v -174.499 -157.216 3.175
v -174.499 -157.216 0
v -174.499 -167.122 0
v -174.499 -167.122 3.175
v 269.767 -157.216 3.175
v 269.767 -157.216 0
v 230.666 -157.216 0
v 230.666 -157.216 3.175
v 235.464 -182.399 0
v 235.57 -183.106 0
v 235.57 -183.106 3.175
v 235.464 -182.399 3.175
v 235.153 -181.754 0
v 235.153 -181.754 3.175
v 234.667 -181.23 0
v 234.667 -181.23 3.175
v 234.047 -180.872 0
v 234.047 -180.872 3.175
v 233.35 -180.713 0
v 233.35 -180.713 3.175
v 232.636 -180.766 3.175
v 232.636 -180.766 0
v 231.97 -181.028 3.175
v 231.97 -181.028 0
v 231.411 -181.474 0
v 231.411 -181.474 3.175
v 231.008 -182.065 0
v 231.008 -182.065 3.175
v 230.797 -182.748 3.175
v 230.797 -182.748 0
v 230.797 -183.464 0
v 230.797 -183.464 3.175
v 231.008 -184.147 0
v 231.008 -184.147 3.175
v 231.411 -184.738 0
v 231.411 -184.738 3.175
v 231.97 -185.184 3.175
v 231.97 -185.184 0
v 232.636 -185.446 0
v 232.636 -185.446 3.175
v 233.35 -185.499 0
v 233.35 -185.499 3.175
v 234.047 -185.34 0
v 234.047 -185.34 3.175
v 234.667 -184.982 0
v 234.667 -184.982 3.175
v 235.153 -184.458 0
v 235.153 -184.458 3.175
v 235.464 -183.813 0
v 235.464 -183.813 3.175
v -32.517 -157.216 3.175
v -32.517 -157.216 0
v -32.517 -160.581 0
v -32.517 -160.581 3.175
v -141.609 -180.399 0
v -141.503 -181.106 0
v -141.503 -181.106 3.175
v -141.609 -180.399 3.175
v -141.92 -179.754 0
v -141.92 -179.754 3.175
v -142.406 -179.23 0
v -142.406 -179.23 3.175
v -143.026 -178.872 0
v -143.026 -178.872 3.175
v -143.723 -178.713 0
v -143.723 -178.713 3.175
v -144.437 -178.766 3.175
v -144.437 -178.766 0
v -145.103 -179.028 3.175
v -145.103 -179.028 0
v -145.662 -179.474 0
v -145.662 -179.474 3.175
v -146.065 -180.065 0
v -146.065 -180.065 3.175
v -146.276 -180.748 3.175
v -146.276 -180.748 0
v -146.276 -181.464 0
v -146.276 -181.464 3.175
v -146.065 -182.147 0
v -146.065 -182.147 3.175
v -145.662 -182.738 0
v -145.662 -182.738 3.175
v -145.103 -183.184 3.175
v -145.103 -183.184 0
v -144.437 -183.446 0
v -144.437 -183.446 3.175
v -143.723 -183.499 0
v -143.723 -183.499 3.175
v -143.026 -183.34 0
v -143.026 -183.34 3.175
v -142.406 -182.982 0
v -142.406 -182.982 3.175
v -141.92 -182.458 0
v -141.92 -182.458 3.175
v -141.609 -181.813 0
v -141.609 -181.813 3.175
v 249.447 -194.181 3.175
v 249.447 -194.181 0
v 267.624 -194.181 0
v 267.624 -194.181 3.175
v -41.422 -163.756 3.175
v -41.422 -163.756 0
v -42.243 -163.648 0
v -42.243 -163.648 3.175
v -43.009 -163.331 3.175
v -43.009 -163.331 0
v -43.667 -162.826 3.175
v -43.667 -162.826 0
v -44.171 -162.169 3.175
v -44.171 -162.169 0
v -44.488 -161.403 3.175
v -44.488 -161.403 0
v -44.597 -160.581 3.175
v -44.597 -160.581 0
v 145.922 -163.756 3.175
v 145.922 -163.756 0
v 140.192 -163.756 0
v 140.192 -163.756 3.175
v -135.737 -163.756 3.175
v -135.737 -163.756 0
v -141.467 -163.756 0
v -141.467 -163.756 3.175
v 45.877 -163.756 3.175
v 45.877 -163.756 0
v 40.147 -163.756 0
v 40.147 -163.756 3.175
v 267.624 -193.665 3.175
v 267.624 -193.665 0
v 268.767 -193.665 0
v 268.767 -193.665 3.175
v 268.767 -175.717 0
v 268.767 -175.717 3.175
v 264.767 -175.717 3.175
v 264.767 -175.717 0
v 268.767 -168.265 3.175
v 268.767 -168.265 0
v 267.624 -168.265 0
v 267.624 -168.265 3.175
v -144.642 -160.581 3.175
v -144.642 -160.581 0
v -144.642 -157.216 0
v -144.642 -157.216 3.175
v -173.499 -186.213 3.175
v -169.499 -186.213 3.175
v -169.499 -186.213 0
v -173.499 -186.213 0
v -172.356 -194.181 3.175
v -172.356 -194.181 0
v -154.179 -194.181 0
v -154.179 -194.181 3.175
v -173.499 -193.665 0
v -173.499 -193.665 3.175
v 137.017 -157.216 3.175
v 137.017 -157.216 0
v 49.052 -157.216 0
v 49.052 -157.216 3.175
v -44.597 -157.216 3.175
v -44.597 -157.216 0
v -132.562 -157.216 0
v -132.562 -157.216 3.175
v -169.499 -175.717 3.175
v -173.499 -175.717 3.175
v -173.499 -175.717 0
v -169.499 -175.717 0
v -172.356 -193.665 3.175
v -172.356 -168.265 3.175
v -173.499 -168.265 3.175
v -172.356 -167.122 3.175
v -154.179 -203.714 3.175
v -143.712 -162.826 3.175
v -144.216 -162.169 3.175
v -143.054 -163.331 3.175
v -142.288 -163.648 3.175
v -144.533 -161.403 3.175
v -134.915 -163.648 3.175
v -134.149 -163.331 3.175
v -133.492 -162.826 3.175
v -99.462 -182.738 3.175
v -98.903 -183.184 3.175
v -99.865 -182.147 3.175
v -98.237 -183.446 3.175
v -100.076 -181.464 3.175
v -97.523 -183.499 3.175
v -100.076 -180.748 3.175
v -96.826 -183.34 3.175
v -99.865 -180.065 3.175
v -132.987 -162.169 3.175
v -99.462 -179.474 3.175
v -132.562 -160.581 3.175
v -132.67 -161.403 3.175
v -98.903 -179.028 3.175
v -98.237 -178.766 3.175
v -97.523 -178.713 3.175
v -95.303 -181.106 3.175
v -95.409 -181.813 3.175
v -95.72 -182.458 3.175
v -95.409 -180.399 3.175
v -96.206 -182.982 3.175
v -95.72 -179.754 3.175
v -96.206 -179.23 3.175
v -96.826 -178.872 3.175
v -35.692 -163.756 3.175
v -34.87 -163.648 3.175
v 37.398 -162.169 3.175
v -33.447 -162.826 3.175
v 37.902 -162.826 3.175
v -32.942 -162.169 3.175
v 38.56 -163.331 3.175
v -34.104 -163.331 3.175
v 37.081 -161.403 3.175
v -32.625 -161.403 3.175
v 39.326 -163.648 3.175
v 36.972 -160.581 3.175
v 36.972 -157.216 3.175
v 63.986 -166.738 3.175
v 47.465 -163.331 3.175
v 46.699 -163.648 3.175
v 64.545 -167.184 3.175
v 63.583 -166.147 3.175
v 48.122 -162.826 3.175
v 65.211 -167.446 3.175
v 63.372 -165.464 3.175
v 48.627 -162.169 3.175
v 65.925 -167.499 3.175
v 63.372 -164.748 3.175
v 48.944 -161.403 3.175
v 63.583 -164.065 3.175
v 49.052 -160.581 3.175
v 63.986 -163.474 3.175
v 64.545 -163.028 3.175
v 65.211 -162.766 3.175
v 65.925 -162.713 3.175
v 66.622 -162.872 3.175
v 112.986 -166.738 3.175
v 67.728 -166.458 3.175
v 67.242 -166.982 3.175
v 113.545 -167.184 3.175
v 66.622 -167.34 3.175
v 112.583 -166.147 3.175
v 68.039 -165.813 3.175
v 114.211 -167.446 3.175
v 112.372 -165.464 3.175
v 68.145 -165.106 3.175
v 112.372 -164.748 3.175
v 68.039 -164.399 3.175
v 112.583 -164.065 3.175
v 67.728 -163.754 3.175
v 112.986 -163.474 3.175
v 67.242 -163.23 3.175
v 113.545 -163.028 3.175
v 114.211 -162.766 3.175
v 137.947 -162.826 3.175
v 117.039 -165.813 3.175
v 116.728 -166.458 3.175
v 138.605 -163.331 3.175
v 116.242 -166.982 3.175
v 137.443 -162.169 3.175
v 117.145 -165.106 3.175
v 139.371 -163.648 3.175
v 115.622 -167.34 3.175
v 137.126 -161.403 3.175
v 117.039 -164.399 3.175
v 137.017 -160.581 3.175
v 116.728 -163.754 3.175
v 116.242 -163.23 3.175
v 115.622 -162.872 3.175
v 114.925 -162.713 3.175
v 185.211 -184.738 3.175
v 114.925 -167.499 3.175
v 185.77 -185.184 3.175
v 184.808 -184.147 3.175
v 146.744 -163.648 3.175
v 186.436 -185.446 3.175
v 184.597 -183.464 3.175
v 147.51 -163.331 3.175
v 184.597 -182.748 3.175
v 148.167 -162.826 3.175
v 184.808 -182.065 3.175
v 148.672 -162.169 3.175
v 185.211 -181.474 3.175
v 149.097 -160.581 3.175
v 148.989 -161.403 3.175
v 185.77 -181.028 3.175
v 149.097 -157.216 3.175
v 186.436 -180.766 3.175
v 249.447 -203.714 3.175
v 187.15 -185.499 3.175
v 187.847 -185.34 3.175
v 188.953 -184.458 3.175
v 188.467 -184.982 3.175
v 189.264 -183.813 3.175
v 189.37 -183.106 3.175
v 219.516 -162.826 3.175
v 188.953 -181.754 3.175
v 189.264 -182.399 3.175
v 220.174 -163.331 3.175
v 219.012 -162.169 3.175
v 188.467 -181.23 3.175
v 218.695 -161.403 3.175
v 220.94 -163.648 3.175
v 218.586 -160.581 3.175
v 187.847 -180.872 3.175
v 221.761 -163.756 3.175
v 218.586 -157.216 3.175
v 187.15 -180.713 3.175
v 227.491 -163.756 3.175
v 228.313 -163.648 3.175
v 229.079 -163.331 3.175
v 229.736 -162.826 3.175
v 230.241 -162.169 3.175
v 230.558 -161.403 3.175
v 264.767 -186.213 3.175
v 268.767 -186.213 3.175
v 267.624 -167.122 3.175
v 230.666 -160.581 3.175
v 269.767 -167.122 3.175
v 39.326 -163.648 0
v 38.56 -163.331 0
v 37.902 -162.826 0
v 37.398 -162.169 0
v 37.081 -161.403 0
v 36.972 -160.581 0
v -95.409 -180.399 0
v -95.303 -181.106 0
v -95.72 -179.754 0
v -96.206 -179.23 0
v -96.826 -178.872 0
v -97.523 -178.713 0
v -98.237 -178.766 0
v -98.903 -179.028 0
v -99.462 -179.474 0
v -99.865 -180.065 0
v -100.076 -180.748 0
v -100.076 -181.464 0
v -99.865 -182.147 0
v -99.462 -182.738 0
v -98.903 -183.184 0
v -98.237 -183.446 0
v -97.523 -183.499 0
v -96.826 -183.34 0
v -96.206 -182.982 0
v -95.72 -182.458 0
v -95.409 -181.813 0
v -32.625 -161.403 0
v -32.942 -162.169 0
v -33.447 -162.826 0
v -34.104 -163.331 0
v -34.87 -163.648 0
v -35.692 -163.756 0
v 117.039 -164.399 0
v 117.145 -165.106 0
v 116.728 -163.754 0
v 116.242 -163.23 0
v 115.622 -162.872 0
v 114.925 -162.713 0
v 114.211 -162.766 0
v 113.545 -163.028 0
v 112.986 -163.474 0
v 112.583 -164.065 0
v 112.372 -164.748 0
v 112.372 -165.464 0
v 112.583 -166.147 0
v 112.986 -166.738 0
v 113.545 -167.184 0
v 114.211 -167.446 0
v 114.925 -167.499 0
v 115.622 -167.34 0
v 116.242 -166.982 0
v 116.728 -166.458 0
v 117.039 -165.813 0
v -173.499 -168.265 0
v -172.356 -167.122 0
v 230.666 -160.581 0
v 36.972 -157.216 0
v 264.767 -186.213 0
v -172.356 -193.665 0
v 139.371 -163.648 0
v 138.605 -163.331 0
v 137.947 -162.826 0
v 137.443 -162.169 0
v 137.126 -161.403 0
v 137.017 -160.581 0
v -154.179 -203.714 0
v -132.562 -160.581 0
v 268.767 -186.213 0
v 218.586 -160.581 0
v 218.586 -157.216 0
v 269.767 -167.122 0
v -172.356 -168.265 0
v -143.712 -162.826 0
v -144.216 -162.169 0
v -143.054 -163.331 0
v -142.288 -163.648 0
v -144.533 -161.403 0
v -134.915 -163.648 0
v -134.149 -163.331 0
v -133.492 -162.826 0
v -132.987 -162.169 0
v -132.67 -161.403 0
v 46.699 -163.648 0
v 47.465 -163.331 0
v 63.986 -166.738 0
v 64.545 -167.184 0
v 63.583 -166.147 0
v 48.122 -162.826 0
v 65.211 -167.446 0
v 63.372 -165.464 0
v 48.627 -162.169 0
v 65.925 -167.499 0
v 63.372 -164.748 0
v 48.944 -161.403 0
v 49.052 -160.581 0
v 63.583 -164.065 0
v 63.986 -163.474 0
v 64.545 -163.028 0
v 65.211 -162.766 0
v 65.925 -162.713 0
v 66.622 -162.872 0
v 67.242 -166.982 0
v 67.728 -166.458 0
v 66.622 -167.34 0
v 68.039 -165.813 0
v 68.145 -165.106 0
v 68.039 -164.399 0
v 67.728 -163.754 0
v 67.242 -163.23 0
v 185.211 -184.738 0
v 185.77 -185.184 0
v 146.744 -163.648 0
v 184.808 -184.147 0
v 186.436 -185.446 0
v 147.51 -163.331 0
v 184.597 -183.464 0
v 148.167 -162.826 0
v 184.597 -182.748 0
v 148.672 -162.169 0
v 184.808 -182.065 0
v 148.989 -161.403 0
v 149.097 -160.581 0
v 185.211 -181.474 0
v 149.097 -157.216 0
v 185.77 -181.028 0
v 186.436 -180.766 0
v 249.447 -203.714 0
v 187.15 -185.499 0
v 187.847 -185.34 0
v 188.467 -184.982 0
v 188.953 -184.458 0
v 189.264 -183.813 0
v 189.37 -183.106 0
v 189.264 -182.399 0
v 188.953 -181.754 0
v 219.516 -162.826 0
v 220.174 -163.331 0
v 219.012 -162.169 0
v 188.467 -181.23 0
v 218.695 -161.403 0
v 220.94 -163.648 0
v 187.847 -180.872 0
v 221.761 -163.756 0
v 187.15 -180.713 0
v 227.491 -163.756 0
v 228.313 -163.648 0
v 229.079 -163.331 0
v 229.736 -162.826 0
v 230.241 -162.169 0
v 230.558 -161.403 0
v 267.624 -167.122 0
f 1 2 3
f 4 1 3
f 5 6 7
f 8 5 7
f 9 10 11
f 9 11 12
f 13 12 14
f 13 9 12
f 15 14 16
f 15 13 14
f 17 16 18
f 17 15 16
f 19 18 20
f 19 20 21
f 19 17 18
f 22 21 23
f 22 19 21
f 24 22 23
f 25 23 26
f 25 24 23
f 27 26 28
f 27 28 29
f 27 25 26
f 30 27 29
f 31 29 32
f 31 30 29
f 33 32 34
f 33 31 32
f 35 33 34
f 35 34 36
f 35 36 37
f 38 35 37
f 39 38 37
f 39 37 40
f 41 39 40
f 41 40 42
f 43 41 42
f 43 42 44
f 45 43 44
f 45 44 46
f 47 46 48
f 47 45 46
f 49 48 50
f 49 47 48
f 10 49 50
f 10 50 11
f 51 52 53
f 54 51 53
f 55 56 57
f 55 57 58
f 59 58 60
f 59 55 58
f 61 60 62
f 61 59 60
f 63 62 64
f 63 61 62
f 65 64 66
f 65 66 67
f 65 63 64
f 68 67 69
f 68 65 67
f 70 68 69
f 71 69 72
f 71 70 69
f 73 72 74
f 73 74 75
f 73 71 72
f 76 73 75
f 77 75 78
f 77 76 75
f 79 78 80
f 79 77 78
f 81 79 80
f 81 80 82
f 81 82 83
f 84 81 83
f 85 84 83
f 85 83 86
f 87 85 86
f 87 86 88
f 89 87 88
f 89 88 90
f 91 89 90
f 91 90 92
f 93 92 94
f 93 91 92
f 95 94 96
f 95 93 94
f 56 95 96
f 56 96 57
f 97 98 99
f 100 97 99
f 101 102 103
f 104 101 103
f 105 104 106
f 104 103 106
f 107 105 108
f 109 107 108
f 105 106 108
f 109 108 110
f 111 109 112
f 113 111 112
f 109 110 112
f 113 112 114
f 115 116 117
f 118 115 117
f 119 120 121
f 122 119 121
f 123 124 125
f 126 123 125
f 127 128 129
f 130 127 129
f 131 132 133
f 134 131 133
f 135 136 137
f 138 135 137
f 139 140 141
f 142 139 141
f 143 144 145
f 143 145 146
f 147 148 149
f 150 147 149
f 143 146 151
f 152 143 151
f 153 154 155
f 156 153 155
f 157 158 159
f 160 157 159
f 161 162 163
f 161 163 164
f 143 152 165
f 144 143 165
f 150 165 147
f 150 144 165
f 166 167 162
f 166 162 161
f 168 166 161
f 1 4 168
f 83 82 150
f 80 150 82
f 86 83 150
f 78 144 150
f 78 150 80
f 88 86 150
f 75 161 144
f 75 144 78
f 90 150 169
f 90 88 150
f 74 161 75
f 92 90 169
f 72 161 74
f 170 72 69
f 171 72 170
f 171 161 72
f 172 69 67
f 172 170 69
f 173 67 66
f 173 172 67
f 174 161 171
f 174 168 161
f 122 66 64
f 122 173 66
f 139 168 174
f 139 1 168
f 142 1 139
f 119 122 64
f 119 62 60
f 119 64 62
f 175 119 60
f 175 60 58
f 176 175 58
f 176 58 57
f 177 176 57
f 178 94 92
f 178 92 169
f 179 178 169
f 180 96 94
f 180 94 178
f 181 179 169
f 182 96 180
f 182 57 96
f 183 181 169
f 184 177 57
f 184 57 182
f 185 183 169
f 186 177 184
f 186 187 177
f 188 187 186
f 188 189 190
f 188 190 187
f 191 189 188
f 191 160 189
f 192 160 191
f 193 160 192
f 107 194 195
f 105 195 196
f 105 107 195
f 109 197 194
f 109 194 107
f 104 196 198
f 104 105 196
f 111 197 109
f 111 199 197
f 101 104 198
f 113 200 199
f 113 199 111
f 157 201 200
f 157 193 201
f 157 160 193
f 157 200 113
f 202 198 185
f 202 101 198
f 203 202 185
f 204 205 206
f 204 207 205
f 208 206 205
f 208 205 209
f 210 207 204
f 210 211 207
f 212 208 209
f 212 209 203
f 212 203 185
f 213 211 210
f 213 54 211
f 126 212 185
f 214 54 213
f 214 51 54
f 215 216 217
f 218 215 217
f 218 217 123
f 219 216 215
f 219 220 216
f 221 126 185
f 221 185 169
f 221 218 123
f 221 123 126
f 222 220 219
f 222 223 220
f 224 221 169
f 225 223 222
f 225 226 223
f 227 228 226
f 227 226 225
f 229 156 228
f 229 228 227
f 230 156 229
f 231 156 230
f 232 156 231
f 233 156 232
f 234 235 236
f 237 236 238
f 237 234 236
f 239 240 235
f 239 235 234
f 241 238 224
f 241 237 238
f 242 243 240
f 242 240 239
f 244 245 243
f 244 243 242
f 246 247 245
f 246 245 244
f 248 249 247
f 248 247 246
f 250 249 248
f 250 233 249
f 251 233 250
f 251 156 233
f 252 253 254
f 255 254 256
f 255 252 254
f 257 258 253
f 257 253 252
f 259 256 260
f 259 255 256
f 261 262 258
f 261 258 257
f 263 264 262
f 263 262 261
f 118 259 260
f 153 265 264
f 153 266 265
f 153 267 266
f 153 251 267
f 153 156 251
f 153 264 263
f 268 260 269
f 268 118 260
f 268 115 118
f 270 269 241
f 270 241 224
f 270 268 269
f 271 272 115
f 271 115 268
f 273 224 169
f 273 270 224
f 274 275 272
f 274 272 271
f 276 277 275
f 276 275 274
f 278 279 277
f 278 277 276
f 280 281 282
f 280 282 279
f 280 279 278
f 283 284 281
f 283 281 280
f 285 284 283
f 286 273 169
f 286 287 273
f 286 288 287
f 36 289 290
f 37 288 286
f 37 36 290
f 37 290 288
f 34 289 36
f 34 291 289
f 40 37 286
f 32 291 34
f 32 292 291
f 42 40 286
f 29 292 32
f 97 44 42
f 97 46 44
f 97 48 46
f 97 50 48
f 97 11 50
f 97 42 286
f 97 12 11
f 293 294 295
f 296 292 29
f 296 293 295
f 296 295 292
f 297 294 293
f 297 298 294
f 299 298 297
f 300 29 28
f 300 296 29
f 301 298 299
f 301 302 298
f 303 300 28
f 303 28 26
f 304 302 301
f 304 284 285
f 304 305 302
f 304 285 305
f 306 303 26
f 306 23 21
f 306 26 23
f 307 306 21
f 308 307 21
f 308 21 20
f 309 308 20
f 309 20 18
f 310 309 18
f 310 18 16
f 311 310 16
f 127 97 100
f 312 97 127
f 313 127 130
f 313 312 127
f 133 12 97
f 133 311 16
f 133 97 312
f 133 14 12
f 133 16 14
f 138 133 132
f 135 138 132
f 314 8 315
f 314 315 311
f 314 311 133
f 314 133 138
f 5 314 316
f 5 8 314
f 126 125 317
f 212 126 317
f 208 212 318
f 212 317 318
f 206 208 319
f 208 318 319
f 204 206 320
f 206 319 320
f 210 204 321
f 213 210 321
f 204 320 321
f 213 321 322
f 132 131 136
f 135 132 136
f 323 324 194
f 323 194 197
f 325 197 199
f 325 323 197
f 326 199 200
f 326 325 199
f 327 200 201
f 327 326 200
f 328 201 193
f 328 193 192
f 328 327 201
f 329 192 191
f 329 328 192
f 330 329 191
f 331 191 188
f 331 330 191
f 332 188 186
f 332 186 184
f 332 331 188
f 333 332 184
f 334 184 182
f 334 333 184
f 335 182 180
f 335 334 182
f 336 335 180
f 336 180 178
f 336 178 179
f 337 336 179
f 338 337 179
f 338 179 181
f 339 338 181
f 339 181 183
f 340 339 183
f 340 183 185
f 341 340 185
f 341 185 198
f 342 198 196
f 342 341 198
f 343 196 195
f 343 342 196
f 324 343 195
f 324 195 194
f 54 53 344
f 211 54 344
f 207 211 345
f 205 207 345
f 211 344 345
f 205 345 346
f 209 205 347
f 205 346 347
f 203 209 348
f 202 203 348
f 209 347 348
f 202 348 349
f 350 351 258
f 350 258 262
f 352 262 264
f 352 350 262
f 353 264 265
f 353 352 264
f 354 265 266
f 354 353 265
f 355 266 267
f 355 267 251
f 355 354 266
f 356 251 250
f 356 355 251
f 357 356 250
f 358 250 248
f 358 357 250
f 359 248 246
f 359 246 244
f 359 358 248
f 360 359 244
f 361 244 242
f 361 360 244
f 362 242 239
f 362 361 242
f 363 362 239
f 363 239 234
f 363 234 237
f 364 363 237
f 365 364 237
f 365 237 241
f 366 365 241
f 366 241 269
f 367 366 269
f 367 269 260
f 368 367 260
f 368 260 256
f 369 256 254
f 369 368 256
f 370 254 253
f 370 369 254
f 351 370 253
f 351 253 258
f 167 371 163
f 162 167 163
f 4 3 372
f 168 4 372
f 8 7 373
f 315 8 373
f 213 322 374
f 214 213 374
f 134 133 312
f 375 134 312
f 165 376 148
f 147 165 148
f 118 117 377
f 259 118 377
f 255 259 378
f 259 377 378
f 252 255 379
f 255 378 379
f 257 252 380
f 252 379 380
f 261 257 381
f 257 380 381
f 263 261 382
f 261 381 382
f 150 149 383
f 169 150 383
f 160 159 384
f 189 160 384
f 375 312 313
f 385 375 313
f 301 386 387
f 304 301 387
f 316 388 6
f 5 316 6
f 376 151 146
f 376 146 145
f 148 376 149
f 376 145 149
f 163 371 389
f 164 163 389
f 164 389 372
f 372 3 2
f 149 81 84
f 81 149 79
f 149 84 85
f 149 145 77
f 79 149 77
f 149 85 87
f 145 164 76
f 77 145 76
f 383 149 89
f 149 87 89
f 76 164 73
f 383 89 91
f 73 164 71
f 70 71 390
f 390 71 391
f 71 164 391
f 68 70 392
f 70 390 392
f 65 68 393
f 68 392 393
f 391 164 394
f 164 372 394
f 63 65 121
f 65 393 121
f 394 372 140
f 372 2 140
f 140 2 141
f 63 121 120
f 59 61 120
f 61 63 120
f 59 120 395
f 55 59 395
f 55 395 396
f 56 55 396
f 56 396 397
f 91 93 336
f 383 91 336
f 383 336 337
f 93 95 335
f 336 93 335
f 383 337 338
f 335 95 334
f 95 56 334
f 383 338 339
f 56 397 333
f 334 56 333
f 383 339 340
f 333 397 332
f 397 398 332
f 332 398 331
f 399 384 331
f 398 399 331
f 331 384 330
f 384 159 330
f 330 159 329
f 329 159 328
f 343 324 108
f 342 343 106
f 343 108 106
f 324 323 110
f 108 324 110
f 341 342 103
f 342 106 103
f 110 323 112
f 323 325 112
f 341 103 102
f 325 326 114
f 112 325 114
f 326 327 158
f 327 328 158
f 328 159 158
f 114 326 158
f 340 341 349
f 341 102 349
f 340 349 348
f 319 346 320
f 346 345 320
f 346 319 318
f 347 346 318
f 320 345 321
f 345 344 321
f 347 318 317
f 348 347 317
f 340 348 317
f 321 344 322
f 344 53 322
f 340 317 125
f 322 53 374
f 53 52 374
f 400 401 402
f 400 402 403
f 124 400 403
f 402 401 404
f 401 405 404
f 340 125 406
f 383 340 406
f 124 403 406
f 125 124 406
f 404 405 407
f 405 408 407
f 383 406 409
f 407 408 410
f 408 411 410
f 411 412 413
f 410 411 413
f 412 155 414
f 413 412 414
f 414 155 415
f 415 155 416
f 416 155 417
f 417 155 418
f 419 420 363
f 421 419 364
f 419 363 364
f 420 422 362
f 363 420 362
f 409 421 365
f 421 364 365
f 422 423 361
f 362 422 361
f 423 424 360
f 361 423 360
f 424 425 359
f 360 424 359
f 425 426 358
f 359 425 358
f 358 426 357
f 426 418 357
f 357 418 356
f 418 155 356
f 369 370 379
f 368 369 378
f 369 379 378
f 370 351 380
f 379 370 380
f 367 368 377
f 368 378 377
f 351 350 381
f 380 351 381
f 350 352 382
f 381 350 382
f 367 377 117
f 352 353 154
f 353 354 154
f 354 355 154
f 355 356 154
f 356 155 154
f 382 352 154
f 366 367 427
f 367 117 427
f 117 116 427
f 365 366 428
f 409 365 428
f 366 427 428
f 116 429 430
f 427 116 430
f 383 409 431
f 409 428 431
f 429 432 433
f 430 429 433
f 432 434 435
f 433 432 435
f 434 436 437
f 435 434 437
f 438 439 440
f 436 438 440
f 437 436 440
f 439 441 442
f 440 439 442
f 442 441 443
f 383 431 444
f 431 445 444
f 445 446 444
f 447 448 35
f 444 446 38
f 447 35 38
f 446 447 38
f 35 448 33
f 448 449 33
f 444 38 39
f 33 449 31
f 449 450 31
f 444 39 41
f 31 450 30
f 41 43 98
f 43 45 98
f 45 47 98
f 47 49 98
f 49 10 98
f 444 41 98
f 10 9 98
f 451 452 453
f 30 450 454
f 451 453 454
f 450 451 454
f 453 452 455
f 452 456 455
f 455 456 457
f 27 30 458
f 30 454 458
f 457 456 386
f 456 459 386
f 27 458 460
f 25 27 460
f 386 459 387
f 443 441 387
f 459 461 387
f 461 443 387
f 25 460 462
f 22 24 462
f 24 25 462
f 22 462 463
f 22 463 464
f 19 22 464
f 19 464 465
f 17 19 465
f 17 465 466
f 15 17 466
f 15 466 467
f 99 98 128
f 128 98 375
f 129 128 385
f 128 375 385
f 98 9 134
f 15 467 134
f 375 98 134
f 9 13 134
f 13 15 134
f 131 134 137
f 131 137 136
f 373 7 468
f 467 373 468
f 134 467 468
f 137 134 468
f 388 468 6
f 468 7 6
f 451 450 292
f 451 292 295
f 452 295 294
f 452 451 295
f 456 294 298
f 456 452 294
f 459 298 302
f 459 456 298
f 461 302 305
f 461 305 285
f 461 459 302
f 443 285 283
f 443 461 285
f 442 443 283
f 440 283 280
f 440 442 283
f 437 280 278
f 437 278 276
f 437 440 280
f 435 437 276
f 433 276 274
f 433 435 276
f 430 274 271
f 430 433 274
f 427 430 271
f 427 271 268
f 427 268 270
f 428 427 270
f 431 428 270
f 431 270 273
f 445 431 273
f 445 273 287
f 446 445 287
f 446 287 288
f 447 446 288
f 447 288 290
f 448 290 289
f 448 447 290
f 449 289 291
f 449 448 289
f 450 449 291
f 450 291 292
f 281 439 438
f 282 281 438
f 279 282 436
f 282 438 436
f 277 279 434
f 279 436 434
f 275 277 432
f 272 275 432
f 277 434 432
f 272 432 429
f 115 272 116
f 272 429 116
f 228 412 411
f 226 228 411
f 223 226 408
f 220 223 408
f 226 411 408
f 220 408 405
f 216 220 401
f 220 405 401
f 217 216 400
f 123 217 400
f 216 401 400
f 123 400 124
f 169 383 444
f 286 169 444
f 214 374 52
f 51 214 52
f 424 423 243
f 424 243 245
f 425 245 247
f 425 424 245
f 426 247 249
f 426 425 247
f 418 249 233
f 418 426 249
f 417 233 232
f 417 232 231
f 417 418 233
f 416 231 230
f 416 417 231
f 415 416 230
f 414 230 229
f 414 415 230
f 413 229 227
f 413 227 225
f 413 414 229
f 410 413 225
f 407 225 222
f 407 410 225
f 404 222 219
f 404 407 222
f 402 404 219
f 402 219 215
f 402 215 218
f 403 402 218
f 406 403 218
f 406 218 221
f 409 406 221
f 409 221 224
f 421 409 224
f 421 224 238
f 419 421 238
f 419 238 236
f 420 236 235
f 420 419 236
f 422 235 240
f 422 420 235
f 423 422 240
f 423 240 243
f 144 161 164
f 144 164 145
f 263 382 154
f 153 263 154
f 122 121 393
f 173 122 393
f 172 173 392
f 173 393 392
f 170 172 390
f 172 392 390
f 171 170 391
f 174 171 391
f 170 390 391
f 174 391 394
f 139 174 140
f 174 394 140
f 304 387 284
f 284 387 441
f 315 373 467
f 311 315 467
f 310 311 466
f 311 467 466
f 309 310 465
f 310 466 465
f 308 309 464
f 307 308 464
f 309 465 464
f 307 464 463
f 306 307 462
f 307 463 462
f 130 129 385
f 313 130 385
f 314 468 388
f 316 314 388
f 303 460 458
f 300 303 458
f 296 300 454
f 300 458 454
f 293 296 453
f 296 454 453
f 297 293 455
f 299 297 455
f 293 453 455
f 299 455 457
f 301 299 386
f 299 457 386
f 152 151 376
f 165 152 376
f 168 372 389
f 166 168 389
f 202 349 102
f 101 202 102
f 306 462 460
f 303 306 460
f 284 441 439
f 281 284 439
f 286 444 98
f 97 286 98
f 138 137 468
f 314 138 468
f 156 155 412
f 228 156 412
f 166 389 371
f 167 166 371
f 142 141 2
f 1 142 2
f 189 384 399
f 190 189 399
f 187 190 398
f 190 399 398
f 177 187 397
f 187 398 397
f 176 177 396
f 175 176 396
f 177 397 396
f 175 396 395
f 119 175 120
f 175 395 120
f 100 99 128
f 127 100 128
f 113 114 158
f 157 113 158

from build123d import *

# Parameters (mm, degrees)
BOSS_EXTRUDE1_DEPTH          = 3.175
M4_CLEARANCE_HOLE1_OUTLINE_R = 2.4
M4_CLEARANCE_HOLE1_DEPTH     = 3.175
CUT_EXTRUDE1_DEPTH           = 3.175


# Read off the part's stored shape, not the designer's step: M4 Clearance Hole1
with BuildPart() as part:
    # Sketch2 → Boss-Extrude1 (new body)
    with BuildSketch(Plane.XY):
        with BuildLine():
            Line((227.491320086, -163.756000107), (221.761320086, -163.756000107))
            ThreePointArc((221.761320086, -163.756000107), (219.516256056, -162.826064137), (218.586320086, -160.581000107))
            Line((218.586320086, -160.581000107), (218.586320086, -157.216000107))
            Line((218.586320086, -157.216000107), (149.097320094, -157.216000107))
            Line((149.097320094, -157.216000107), (149.097320094, -160.581000107))
            ThreePointArc((149.097320094, -160.581000107), (148.167384125, -162.826064137), (145.922320094, -163.756000107))
            Line((145.922320094, -163.756000107), (140.192320094, -163.756000107))
            ThreePointArc((140.192320094, -163.756000107), (137.947256064, -162.826064137), (137.017320094, -160.581000107))
            Line((137.017320094, -160.581000107), (137.017320094, -157.216000107))
            Line((137.017320094, -157.216000107), (49.052320094, -157.216000107))
            Line((49.052320094, -157.216000107), (49.052320094, -160.581000107))
            ThreePointArc((49.052320094, -160.581000107), (48.122384125, -162.826064137), (45.877320094, -163.756000107))
            Line((45.877320094, -163.756000107), (40.147320094, -163.756000107))
            ThreePointArc((40.147320094, -163.756000107), (37.902256064, -162.826064137), (36.972320094, -160.581000107))
            Line((36.972320094, -160.581000107), (36.972320094, -157.216000107))
            Line((36.972320094, -157.216000107), (-32.516679898, -157.216000107))
            Line((-32.516679898, -157.216000107), (-32.516679898, -160.581000107))
            ThreePointArc((-32.516679898, -160.581000107), (-33.446615867, -162.826064137), (-35.691679898, -163.756000107))
            Line((-35.691679898, -163.756000107), (-41.421679898, -163.756000107))
            ThreePointArc((-41.421679898, -163.756000107), (-43.666743928, -162.826064137), (-44.596679898, -160.581000107))
            Line((-44.596679898, -160.581000107), (-44.596679898, -157.216000107))
            Line((-44.596679898, -157.216000107), (-132.561679898, -157.216000107))
            Line((-132.561679898, -157.216000107), (-132.561679898, -160.581000107))
            ThreePointArc((-132.561679898, -160.581000107), (-133.491615867, -162.826064137), (-135.736679898, -163.756000107))
            Line((-135.736679898, -163.756000107), (-141.466679898, -163.756000107))
            ThreePointArc((-141.466679898, -163.756000107), (-143.711743928, -162.826064137), (-144.641679898, -160.581000107))
            Line((-144.641679898, -160.581000107), (-144.641679898, -157.216000107))
            Line((-144.641679898, -157.216000107), (-174.499179878, -157.216000107))
            Line((-174.499179878, -157.216000107), (-174.499179878, -167.122000107))
            Line((-174.499179878, -167.122000107), (-172.356179878, -167.122000107))
            Line((-172.356179878, -167.122000107), (-172.356179878, -168.265000107))
            Line((-172.356179878, -168.265000107), (-173.499179878, -168.265000107))
            Line((-173.499179878, -168.265000107), (-173.499179878, -193.665000107))
            Line((-173.499179878, -193.665000107), (-172.356179878, -193.665000107))
            Line((-172.356179878, -193.665000107), (-172.356179878, -194.181000107))
            Line((-172.356179878, -194.181000107), (-154.179179878, -194.181000107))
            Line((-154.179179878, -194.181000107), (-154.179179878, -203.714000107))
            Line((-154.179179878, -203.714000107), (249.446820082, -203.714000107))
            Line((249.446820082, -203.714000107), (249.446820082, -194.181000107))
            Line((249.446820082, -194.181000107), (267.623820082, -194.181000107))
            Line((267.623820082, -194.181000107), (267.623820082, -193.665000107))
            Line((267.623820082, -193.665000107), (268.766820082, -193.665000107))
            Line((268.766820082, -193.665000107), (268.766820082, -168.265000107))
            Line((268.766820082, -168.265000107), (267.623820082, -168.265000107))
            Line((267.623820082, -168.265000107), (267.623820082, -167.122000107))
            Line((267.623820082, -167.122000107), (269.766820082, -167.122000107))
            Line((269.766820082, -167.122000107), (269.766820082, -157.216000107))
            Line((269.766820082, -157.216000107), (230.666320086, -157.216000107))
            Line((230.666320086, -157.216000107), (230.666320086, -160.581000107))
            ThreePointArc((230.666320086, -160.581000107), (229.736384117, -162.826064137), (227.491320086, -163.756000107))
        make_face()
    extrude(amount=BOSS_EXTRUDE1_DEPTH)

    # M4 Clearance Hole1 outline → M4 Clearance Hole1 (cut)
    with BuildSketch(Plane.XY):
        with Locations((233.170320102, -183.106000107)):
            Circle(M4_CLEARANCE_HOLE1_OUTLINE_R)
        with Locations((186.970320102, -183.106000107)):
            Circle(M4_CLEARANCE_HOLE1_OUTLINE_R)
        with Locations((114.745320102, -165.106000107)):
            Circle(M4_CLEARANCE_HOLE1_OUTLINE_R)
        with Locations((65.745320102, -165.106000107)):
            Circle(M4_CLEARANCE_HOLE1_OUTLINE_R)
        with Locations((-97.702679898, -181.106000107)):
            Circle(M4_CLEARANCE_HOLE1_OUTLINE_R)
        with Locations((-143.902679898, -181.106000107)):
            Circle(M4_CLEARANCE_HOLE1_OUTLINE_R)
    extrude(amount=M4_CLEARANCE_HOLE1_DEPTH, mode=Mode.SUBTRACT)

    # Sketch5 → Cut-Extrude1 (cut)
    with BuildSketch(Plane.XY.offset(3.175)):
        Polygon((264.766820082, -175.717058259), (268.766820082, -175.717058259), (268.766820082, -176.460000107), (266.515167585, -176.460000107), (264.766820082, -176.928468408), align=None)
        with BuildLine():
            Line((271.531820082, -185.652747691), (271.531820082, -186.212941955))
            Line((271.531820082, -186.212941955), (268.766820082, -186.212941955))
            Line((268.766820082, -186.212941955), (268.766820082, -185.470000107))
            Line((268.766820082, -185.470000107), (266.515167585, -185.470000107))
            Line((266.515167585, -185.470000107), (264.766820082, -185.001531806))
            Line((264.766820082, -185.001531806), (264.766820082, -176.928468408))
            Line((264.766820082, -176.928468408), (266.515167585, -176.460000107))
            Line((266.515167585, -176.460000107), (268.766820082, -176.460000107))
            Line((268.766820082, -176.460000107), (268.766820082, -175.717058259))
            Line((268.766820082, -175.717058259), (271.531820082, -175.717058259))
            Line((271.531820082, -175.717058259), (271.531820082, -176.277252523))
            ThreePointArc((271.531820082, -176.277252523), (272.085217516, -176.676347658), (272.296820082, -177.325000107))
            Line((272.296820082, -177.325000107), (272.296820082, -184.605000107))
            ThreePointArc((272.296820082, -184.605000107), (272.085217516, -185.253652556), (271.531820082, -185.652747691))
        make_face()
        Polygon((264.766820082, -185.001531806), (264.766820082, -186.212941955), (268.766820082, -186.212941955), (268.766820082, -185.470000107), (266.515167585, -185.470000107), align=None)
    cut_extrude1 = extrude(amount=-CUT_EXTRUDE1_DEPTH, mode=Mode.SUBTRACT)

    # Mirror1: Cut-Extrude1 across plane
    add(cut_extrude1.mirror(Plane(origin=(47.633820102, 0, 0), x_dir=(0, 0, 1), z_dir=(1, 0, 0))), mode=Mode.SUBTRACT)


solid = part.part
